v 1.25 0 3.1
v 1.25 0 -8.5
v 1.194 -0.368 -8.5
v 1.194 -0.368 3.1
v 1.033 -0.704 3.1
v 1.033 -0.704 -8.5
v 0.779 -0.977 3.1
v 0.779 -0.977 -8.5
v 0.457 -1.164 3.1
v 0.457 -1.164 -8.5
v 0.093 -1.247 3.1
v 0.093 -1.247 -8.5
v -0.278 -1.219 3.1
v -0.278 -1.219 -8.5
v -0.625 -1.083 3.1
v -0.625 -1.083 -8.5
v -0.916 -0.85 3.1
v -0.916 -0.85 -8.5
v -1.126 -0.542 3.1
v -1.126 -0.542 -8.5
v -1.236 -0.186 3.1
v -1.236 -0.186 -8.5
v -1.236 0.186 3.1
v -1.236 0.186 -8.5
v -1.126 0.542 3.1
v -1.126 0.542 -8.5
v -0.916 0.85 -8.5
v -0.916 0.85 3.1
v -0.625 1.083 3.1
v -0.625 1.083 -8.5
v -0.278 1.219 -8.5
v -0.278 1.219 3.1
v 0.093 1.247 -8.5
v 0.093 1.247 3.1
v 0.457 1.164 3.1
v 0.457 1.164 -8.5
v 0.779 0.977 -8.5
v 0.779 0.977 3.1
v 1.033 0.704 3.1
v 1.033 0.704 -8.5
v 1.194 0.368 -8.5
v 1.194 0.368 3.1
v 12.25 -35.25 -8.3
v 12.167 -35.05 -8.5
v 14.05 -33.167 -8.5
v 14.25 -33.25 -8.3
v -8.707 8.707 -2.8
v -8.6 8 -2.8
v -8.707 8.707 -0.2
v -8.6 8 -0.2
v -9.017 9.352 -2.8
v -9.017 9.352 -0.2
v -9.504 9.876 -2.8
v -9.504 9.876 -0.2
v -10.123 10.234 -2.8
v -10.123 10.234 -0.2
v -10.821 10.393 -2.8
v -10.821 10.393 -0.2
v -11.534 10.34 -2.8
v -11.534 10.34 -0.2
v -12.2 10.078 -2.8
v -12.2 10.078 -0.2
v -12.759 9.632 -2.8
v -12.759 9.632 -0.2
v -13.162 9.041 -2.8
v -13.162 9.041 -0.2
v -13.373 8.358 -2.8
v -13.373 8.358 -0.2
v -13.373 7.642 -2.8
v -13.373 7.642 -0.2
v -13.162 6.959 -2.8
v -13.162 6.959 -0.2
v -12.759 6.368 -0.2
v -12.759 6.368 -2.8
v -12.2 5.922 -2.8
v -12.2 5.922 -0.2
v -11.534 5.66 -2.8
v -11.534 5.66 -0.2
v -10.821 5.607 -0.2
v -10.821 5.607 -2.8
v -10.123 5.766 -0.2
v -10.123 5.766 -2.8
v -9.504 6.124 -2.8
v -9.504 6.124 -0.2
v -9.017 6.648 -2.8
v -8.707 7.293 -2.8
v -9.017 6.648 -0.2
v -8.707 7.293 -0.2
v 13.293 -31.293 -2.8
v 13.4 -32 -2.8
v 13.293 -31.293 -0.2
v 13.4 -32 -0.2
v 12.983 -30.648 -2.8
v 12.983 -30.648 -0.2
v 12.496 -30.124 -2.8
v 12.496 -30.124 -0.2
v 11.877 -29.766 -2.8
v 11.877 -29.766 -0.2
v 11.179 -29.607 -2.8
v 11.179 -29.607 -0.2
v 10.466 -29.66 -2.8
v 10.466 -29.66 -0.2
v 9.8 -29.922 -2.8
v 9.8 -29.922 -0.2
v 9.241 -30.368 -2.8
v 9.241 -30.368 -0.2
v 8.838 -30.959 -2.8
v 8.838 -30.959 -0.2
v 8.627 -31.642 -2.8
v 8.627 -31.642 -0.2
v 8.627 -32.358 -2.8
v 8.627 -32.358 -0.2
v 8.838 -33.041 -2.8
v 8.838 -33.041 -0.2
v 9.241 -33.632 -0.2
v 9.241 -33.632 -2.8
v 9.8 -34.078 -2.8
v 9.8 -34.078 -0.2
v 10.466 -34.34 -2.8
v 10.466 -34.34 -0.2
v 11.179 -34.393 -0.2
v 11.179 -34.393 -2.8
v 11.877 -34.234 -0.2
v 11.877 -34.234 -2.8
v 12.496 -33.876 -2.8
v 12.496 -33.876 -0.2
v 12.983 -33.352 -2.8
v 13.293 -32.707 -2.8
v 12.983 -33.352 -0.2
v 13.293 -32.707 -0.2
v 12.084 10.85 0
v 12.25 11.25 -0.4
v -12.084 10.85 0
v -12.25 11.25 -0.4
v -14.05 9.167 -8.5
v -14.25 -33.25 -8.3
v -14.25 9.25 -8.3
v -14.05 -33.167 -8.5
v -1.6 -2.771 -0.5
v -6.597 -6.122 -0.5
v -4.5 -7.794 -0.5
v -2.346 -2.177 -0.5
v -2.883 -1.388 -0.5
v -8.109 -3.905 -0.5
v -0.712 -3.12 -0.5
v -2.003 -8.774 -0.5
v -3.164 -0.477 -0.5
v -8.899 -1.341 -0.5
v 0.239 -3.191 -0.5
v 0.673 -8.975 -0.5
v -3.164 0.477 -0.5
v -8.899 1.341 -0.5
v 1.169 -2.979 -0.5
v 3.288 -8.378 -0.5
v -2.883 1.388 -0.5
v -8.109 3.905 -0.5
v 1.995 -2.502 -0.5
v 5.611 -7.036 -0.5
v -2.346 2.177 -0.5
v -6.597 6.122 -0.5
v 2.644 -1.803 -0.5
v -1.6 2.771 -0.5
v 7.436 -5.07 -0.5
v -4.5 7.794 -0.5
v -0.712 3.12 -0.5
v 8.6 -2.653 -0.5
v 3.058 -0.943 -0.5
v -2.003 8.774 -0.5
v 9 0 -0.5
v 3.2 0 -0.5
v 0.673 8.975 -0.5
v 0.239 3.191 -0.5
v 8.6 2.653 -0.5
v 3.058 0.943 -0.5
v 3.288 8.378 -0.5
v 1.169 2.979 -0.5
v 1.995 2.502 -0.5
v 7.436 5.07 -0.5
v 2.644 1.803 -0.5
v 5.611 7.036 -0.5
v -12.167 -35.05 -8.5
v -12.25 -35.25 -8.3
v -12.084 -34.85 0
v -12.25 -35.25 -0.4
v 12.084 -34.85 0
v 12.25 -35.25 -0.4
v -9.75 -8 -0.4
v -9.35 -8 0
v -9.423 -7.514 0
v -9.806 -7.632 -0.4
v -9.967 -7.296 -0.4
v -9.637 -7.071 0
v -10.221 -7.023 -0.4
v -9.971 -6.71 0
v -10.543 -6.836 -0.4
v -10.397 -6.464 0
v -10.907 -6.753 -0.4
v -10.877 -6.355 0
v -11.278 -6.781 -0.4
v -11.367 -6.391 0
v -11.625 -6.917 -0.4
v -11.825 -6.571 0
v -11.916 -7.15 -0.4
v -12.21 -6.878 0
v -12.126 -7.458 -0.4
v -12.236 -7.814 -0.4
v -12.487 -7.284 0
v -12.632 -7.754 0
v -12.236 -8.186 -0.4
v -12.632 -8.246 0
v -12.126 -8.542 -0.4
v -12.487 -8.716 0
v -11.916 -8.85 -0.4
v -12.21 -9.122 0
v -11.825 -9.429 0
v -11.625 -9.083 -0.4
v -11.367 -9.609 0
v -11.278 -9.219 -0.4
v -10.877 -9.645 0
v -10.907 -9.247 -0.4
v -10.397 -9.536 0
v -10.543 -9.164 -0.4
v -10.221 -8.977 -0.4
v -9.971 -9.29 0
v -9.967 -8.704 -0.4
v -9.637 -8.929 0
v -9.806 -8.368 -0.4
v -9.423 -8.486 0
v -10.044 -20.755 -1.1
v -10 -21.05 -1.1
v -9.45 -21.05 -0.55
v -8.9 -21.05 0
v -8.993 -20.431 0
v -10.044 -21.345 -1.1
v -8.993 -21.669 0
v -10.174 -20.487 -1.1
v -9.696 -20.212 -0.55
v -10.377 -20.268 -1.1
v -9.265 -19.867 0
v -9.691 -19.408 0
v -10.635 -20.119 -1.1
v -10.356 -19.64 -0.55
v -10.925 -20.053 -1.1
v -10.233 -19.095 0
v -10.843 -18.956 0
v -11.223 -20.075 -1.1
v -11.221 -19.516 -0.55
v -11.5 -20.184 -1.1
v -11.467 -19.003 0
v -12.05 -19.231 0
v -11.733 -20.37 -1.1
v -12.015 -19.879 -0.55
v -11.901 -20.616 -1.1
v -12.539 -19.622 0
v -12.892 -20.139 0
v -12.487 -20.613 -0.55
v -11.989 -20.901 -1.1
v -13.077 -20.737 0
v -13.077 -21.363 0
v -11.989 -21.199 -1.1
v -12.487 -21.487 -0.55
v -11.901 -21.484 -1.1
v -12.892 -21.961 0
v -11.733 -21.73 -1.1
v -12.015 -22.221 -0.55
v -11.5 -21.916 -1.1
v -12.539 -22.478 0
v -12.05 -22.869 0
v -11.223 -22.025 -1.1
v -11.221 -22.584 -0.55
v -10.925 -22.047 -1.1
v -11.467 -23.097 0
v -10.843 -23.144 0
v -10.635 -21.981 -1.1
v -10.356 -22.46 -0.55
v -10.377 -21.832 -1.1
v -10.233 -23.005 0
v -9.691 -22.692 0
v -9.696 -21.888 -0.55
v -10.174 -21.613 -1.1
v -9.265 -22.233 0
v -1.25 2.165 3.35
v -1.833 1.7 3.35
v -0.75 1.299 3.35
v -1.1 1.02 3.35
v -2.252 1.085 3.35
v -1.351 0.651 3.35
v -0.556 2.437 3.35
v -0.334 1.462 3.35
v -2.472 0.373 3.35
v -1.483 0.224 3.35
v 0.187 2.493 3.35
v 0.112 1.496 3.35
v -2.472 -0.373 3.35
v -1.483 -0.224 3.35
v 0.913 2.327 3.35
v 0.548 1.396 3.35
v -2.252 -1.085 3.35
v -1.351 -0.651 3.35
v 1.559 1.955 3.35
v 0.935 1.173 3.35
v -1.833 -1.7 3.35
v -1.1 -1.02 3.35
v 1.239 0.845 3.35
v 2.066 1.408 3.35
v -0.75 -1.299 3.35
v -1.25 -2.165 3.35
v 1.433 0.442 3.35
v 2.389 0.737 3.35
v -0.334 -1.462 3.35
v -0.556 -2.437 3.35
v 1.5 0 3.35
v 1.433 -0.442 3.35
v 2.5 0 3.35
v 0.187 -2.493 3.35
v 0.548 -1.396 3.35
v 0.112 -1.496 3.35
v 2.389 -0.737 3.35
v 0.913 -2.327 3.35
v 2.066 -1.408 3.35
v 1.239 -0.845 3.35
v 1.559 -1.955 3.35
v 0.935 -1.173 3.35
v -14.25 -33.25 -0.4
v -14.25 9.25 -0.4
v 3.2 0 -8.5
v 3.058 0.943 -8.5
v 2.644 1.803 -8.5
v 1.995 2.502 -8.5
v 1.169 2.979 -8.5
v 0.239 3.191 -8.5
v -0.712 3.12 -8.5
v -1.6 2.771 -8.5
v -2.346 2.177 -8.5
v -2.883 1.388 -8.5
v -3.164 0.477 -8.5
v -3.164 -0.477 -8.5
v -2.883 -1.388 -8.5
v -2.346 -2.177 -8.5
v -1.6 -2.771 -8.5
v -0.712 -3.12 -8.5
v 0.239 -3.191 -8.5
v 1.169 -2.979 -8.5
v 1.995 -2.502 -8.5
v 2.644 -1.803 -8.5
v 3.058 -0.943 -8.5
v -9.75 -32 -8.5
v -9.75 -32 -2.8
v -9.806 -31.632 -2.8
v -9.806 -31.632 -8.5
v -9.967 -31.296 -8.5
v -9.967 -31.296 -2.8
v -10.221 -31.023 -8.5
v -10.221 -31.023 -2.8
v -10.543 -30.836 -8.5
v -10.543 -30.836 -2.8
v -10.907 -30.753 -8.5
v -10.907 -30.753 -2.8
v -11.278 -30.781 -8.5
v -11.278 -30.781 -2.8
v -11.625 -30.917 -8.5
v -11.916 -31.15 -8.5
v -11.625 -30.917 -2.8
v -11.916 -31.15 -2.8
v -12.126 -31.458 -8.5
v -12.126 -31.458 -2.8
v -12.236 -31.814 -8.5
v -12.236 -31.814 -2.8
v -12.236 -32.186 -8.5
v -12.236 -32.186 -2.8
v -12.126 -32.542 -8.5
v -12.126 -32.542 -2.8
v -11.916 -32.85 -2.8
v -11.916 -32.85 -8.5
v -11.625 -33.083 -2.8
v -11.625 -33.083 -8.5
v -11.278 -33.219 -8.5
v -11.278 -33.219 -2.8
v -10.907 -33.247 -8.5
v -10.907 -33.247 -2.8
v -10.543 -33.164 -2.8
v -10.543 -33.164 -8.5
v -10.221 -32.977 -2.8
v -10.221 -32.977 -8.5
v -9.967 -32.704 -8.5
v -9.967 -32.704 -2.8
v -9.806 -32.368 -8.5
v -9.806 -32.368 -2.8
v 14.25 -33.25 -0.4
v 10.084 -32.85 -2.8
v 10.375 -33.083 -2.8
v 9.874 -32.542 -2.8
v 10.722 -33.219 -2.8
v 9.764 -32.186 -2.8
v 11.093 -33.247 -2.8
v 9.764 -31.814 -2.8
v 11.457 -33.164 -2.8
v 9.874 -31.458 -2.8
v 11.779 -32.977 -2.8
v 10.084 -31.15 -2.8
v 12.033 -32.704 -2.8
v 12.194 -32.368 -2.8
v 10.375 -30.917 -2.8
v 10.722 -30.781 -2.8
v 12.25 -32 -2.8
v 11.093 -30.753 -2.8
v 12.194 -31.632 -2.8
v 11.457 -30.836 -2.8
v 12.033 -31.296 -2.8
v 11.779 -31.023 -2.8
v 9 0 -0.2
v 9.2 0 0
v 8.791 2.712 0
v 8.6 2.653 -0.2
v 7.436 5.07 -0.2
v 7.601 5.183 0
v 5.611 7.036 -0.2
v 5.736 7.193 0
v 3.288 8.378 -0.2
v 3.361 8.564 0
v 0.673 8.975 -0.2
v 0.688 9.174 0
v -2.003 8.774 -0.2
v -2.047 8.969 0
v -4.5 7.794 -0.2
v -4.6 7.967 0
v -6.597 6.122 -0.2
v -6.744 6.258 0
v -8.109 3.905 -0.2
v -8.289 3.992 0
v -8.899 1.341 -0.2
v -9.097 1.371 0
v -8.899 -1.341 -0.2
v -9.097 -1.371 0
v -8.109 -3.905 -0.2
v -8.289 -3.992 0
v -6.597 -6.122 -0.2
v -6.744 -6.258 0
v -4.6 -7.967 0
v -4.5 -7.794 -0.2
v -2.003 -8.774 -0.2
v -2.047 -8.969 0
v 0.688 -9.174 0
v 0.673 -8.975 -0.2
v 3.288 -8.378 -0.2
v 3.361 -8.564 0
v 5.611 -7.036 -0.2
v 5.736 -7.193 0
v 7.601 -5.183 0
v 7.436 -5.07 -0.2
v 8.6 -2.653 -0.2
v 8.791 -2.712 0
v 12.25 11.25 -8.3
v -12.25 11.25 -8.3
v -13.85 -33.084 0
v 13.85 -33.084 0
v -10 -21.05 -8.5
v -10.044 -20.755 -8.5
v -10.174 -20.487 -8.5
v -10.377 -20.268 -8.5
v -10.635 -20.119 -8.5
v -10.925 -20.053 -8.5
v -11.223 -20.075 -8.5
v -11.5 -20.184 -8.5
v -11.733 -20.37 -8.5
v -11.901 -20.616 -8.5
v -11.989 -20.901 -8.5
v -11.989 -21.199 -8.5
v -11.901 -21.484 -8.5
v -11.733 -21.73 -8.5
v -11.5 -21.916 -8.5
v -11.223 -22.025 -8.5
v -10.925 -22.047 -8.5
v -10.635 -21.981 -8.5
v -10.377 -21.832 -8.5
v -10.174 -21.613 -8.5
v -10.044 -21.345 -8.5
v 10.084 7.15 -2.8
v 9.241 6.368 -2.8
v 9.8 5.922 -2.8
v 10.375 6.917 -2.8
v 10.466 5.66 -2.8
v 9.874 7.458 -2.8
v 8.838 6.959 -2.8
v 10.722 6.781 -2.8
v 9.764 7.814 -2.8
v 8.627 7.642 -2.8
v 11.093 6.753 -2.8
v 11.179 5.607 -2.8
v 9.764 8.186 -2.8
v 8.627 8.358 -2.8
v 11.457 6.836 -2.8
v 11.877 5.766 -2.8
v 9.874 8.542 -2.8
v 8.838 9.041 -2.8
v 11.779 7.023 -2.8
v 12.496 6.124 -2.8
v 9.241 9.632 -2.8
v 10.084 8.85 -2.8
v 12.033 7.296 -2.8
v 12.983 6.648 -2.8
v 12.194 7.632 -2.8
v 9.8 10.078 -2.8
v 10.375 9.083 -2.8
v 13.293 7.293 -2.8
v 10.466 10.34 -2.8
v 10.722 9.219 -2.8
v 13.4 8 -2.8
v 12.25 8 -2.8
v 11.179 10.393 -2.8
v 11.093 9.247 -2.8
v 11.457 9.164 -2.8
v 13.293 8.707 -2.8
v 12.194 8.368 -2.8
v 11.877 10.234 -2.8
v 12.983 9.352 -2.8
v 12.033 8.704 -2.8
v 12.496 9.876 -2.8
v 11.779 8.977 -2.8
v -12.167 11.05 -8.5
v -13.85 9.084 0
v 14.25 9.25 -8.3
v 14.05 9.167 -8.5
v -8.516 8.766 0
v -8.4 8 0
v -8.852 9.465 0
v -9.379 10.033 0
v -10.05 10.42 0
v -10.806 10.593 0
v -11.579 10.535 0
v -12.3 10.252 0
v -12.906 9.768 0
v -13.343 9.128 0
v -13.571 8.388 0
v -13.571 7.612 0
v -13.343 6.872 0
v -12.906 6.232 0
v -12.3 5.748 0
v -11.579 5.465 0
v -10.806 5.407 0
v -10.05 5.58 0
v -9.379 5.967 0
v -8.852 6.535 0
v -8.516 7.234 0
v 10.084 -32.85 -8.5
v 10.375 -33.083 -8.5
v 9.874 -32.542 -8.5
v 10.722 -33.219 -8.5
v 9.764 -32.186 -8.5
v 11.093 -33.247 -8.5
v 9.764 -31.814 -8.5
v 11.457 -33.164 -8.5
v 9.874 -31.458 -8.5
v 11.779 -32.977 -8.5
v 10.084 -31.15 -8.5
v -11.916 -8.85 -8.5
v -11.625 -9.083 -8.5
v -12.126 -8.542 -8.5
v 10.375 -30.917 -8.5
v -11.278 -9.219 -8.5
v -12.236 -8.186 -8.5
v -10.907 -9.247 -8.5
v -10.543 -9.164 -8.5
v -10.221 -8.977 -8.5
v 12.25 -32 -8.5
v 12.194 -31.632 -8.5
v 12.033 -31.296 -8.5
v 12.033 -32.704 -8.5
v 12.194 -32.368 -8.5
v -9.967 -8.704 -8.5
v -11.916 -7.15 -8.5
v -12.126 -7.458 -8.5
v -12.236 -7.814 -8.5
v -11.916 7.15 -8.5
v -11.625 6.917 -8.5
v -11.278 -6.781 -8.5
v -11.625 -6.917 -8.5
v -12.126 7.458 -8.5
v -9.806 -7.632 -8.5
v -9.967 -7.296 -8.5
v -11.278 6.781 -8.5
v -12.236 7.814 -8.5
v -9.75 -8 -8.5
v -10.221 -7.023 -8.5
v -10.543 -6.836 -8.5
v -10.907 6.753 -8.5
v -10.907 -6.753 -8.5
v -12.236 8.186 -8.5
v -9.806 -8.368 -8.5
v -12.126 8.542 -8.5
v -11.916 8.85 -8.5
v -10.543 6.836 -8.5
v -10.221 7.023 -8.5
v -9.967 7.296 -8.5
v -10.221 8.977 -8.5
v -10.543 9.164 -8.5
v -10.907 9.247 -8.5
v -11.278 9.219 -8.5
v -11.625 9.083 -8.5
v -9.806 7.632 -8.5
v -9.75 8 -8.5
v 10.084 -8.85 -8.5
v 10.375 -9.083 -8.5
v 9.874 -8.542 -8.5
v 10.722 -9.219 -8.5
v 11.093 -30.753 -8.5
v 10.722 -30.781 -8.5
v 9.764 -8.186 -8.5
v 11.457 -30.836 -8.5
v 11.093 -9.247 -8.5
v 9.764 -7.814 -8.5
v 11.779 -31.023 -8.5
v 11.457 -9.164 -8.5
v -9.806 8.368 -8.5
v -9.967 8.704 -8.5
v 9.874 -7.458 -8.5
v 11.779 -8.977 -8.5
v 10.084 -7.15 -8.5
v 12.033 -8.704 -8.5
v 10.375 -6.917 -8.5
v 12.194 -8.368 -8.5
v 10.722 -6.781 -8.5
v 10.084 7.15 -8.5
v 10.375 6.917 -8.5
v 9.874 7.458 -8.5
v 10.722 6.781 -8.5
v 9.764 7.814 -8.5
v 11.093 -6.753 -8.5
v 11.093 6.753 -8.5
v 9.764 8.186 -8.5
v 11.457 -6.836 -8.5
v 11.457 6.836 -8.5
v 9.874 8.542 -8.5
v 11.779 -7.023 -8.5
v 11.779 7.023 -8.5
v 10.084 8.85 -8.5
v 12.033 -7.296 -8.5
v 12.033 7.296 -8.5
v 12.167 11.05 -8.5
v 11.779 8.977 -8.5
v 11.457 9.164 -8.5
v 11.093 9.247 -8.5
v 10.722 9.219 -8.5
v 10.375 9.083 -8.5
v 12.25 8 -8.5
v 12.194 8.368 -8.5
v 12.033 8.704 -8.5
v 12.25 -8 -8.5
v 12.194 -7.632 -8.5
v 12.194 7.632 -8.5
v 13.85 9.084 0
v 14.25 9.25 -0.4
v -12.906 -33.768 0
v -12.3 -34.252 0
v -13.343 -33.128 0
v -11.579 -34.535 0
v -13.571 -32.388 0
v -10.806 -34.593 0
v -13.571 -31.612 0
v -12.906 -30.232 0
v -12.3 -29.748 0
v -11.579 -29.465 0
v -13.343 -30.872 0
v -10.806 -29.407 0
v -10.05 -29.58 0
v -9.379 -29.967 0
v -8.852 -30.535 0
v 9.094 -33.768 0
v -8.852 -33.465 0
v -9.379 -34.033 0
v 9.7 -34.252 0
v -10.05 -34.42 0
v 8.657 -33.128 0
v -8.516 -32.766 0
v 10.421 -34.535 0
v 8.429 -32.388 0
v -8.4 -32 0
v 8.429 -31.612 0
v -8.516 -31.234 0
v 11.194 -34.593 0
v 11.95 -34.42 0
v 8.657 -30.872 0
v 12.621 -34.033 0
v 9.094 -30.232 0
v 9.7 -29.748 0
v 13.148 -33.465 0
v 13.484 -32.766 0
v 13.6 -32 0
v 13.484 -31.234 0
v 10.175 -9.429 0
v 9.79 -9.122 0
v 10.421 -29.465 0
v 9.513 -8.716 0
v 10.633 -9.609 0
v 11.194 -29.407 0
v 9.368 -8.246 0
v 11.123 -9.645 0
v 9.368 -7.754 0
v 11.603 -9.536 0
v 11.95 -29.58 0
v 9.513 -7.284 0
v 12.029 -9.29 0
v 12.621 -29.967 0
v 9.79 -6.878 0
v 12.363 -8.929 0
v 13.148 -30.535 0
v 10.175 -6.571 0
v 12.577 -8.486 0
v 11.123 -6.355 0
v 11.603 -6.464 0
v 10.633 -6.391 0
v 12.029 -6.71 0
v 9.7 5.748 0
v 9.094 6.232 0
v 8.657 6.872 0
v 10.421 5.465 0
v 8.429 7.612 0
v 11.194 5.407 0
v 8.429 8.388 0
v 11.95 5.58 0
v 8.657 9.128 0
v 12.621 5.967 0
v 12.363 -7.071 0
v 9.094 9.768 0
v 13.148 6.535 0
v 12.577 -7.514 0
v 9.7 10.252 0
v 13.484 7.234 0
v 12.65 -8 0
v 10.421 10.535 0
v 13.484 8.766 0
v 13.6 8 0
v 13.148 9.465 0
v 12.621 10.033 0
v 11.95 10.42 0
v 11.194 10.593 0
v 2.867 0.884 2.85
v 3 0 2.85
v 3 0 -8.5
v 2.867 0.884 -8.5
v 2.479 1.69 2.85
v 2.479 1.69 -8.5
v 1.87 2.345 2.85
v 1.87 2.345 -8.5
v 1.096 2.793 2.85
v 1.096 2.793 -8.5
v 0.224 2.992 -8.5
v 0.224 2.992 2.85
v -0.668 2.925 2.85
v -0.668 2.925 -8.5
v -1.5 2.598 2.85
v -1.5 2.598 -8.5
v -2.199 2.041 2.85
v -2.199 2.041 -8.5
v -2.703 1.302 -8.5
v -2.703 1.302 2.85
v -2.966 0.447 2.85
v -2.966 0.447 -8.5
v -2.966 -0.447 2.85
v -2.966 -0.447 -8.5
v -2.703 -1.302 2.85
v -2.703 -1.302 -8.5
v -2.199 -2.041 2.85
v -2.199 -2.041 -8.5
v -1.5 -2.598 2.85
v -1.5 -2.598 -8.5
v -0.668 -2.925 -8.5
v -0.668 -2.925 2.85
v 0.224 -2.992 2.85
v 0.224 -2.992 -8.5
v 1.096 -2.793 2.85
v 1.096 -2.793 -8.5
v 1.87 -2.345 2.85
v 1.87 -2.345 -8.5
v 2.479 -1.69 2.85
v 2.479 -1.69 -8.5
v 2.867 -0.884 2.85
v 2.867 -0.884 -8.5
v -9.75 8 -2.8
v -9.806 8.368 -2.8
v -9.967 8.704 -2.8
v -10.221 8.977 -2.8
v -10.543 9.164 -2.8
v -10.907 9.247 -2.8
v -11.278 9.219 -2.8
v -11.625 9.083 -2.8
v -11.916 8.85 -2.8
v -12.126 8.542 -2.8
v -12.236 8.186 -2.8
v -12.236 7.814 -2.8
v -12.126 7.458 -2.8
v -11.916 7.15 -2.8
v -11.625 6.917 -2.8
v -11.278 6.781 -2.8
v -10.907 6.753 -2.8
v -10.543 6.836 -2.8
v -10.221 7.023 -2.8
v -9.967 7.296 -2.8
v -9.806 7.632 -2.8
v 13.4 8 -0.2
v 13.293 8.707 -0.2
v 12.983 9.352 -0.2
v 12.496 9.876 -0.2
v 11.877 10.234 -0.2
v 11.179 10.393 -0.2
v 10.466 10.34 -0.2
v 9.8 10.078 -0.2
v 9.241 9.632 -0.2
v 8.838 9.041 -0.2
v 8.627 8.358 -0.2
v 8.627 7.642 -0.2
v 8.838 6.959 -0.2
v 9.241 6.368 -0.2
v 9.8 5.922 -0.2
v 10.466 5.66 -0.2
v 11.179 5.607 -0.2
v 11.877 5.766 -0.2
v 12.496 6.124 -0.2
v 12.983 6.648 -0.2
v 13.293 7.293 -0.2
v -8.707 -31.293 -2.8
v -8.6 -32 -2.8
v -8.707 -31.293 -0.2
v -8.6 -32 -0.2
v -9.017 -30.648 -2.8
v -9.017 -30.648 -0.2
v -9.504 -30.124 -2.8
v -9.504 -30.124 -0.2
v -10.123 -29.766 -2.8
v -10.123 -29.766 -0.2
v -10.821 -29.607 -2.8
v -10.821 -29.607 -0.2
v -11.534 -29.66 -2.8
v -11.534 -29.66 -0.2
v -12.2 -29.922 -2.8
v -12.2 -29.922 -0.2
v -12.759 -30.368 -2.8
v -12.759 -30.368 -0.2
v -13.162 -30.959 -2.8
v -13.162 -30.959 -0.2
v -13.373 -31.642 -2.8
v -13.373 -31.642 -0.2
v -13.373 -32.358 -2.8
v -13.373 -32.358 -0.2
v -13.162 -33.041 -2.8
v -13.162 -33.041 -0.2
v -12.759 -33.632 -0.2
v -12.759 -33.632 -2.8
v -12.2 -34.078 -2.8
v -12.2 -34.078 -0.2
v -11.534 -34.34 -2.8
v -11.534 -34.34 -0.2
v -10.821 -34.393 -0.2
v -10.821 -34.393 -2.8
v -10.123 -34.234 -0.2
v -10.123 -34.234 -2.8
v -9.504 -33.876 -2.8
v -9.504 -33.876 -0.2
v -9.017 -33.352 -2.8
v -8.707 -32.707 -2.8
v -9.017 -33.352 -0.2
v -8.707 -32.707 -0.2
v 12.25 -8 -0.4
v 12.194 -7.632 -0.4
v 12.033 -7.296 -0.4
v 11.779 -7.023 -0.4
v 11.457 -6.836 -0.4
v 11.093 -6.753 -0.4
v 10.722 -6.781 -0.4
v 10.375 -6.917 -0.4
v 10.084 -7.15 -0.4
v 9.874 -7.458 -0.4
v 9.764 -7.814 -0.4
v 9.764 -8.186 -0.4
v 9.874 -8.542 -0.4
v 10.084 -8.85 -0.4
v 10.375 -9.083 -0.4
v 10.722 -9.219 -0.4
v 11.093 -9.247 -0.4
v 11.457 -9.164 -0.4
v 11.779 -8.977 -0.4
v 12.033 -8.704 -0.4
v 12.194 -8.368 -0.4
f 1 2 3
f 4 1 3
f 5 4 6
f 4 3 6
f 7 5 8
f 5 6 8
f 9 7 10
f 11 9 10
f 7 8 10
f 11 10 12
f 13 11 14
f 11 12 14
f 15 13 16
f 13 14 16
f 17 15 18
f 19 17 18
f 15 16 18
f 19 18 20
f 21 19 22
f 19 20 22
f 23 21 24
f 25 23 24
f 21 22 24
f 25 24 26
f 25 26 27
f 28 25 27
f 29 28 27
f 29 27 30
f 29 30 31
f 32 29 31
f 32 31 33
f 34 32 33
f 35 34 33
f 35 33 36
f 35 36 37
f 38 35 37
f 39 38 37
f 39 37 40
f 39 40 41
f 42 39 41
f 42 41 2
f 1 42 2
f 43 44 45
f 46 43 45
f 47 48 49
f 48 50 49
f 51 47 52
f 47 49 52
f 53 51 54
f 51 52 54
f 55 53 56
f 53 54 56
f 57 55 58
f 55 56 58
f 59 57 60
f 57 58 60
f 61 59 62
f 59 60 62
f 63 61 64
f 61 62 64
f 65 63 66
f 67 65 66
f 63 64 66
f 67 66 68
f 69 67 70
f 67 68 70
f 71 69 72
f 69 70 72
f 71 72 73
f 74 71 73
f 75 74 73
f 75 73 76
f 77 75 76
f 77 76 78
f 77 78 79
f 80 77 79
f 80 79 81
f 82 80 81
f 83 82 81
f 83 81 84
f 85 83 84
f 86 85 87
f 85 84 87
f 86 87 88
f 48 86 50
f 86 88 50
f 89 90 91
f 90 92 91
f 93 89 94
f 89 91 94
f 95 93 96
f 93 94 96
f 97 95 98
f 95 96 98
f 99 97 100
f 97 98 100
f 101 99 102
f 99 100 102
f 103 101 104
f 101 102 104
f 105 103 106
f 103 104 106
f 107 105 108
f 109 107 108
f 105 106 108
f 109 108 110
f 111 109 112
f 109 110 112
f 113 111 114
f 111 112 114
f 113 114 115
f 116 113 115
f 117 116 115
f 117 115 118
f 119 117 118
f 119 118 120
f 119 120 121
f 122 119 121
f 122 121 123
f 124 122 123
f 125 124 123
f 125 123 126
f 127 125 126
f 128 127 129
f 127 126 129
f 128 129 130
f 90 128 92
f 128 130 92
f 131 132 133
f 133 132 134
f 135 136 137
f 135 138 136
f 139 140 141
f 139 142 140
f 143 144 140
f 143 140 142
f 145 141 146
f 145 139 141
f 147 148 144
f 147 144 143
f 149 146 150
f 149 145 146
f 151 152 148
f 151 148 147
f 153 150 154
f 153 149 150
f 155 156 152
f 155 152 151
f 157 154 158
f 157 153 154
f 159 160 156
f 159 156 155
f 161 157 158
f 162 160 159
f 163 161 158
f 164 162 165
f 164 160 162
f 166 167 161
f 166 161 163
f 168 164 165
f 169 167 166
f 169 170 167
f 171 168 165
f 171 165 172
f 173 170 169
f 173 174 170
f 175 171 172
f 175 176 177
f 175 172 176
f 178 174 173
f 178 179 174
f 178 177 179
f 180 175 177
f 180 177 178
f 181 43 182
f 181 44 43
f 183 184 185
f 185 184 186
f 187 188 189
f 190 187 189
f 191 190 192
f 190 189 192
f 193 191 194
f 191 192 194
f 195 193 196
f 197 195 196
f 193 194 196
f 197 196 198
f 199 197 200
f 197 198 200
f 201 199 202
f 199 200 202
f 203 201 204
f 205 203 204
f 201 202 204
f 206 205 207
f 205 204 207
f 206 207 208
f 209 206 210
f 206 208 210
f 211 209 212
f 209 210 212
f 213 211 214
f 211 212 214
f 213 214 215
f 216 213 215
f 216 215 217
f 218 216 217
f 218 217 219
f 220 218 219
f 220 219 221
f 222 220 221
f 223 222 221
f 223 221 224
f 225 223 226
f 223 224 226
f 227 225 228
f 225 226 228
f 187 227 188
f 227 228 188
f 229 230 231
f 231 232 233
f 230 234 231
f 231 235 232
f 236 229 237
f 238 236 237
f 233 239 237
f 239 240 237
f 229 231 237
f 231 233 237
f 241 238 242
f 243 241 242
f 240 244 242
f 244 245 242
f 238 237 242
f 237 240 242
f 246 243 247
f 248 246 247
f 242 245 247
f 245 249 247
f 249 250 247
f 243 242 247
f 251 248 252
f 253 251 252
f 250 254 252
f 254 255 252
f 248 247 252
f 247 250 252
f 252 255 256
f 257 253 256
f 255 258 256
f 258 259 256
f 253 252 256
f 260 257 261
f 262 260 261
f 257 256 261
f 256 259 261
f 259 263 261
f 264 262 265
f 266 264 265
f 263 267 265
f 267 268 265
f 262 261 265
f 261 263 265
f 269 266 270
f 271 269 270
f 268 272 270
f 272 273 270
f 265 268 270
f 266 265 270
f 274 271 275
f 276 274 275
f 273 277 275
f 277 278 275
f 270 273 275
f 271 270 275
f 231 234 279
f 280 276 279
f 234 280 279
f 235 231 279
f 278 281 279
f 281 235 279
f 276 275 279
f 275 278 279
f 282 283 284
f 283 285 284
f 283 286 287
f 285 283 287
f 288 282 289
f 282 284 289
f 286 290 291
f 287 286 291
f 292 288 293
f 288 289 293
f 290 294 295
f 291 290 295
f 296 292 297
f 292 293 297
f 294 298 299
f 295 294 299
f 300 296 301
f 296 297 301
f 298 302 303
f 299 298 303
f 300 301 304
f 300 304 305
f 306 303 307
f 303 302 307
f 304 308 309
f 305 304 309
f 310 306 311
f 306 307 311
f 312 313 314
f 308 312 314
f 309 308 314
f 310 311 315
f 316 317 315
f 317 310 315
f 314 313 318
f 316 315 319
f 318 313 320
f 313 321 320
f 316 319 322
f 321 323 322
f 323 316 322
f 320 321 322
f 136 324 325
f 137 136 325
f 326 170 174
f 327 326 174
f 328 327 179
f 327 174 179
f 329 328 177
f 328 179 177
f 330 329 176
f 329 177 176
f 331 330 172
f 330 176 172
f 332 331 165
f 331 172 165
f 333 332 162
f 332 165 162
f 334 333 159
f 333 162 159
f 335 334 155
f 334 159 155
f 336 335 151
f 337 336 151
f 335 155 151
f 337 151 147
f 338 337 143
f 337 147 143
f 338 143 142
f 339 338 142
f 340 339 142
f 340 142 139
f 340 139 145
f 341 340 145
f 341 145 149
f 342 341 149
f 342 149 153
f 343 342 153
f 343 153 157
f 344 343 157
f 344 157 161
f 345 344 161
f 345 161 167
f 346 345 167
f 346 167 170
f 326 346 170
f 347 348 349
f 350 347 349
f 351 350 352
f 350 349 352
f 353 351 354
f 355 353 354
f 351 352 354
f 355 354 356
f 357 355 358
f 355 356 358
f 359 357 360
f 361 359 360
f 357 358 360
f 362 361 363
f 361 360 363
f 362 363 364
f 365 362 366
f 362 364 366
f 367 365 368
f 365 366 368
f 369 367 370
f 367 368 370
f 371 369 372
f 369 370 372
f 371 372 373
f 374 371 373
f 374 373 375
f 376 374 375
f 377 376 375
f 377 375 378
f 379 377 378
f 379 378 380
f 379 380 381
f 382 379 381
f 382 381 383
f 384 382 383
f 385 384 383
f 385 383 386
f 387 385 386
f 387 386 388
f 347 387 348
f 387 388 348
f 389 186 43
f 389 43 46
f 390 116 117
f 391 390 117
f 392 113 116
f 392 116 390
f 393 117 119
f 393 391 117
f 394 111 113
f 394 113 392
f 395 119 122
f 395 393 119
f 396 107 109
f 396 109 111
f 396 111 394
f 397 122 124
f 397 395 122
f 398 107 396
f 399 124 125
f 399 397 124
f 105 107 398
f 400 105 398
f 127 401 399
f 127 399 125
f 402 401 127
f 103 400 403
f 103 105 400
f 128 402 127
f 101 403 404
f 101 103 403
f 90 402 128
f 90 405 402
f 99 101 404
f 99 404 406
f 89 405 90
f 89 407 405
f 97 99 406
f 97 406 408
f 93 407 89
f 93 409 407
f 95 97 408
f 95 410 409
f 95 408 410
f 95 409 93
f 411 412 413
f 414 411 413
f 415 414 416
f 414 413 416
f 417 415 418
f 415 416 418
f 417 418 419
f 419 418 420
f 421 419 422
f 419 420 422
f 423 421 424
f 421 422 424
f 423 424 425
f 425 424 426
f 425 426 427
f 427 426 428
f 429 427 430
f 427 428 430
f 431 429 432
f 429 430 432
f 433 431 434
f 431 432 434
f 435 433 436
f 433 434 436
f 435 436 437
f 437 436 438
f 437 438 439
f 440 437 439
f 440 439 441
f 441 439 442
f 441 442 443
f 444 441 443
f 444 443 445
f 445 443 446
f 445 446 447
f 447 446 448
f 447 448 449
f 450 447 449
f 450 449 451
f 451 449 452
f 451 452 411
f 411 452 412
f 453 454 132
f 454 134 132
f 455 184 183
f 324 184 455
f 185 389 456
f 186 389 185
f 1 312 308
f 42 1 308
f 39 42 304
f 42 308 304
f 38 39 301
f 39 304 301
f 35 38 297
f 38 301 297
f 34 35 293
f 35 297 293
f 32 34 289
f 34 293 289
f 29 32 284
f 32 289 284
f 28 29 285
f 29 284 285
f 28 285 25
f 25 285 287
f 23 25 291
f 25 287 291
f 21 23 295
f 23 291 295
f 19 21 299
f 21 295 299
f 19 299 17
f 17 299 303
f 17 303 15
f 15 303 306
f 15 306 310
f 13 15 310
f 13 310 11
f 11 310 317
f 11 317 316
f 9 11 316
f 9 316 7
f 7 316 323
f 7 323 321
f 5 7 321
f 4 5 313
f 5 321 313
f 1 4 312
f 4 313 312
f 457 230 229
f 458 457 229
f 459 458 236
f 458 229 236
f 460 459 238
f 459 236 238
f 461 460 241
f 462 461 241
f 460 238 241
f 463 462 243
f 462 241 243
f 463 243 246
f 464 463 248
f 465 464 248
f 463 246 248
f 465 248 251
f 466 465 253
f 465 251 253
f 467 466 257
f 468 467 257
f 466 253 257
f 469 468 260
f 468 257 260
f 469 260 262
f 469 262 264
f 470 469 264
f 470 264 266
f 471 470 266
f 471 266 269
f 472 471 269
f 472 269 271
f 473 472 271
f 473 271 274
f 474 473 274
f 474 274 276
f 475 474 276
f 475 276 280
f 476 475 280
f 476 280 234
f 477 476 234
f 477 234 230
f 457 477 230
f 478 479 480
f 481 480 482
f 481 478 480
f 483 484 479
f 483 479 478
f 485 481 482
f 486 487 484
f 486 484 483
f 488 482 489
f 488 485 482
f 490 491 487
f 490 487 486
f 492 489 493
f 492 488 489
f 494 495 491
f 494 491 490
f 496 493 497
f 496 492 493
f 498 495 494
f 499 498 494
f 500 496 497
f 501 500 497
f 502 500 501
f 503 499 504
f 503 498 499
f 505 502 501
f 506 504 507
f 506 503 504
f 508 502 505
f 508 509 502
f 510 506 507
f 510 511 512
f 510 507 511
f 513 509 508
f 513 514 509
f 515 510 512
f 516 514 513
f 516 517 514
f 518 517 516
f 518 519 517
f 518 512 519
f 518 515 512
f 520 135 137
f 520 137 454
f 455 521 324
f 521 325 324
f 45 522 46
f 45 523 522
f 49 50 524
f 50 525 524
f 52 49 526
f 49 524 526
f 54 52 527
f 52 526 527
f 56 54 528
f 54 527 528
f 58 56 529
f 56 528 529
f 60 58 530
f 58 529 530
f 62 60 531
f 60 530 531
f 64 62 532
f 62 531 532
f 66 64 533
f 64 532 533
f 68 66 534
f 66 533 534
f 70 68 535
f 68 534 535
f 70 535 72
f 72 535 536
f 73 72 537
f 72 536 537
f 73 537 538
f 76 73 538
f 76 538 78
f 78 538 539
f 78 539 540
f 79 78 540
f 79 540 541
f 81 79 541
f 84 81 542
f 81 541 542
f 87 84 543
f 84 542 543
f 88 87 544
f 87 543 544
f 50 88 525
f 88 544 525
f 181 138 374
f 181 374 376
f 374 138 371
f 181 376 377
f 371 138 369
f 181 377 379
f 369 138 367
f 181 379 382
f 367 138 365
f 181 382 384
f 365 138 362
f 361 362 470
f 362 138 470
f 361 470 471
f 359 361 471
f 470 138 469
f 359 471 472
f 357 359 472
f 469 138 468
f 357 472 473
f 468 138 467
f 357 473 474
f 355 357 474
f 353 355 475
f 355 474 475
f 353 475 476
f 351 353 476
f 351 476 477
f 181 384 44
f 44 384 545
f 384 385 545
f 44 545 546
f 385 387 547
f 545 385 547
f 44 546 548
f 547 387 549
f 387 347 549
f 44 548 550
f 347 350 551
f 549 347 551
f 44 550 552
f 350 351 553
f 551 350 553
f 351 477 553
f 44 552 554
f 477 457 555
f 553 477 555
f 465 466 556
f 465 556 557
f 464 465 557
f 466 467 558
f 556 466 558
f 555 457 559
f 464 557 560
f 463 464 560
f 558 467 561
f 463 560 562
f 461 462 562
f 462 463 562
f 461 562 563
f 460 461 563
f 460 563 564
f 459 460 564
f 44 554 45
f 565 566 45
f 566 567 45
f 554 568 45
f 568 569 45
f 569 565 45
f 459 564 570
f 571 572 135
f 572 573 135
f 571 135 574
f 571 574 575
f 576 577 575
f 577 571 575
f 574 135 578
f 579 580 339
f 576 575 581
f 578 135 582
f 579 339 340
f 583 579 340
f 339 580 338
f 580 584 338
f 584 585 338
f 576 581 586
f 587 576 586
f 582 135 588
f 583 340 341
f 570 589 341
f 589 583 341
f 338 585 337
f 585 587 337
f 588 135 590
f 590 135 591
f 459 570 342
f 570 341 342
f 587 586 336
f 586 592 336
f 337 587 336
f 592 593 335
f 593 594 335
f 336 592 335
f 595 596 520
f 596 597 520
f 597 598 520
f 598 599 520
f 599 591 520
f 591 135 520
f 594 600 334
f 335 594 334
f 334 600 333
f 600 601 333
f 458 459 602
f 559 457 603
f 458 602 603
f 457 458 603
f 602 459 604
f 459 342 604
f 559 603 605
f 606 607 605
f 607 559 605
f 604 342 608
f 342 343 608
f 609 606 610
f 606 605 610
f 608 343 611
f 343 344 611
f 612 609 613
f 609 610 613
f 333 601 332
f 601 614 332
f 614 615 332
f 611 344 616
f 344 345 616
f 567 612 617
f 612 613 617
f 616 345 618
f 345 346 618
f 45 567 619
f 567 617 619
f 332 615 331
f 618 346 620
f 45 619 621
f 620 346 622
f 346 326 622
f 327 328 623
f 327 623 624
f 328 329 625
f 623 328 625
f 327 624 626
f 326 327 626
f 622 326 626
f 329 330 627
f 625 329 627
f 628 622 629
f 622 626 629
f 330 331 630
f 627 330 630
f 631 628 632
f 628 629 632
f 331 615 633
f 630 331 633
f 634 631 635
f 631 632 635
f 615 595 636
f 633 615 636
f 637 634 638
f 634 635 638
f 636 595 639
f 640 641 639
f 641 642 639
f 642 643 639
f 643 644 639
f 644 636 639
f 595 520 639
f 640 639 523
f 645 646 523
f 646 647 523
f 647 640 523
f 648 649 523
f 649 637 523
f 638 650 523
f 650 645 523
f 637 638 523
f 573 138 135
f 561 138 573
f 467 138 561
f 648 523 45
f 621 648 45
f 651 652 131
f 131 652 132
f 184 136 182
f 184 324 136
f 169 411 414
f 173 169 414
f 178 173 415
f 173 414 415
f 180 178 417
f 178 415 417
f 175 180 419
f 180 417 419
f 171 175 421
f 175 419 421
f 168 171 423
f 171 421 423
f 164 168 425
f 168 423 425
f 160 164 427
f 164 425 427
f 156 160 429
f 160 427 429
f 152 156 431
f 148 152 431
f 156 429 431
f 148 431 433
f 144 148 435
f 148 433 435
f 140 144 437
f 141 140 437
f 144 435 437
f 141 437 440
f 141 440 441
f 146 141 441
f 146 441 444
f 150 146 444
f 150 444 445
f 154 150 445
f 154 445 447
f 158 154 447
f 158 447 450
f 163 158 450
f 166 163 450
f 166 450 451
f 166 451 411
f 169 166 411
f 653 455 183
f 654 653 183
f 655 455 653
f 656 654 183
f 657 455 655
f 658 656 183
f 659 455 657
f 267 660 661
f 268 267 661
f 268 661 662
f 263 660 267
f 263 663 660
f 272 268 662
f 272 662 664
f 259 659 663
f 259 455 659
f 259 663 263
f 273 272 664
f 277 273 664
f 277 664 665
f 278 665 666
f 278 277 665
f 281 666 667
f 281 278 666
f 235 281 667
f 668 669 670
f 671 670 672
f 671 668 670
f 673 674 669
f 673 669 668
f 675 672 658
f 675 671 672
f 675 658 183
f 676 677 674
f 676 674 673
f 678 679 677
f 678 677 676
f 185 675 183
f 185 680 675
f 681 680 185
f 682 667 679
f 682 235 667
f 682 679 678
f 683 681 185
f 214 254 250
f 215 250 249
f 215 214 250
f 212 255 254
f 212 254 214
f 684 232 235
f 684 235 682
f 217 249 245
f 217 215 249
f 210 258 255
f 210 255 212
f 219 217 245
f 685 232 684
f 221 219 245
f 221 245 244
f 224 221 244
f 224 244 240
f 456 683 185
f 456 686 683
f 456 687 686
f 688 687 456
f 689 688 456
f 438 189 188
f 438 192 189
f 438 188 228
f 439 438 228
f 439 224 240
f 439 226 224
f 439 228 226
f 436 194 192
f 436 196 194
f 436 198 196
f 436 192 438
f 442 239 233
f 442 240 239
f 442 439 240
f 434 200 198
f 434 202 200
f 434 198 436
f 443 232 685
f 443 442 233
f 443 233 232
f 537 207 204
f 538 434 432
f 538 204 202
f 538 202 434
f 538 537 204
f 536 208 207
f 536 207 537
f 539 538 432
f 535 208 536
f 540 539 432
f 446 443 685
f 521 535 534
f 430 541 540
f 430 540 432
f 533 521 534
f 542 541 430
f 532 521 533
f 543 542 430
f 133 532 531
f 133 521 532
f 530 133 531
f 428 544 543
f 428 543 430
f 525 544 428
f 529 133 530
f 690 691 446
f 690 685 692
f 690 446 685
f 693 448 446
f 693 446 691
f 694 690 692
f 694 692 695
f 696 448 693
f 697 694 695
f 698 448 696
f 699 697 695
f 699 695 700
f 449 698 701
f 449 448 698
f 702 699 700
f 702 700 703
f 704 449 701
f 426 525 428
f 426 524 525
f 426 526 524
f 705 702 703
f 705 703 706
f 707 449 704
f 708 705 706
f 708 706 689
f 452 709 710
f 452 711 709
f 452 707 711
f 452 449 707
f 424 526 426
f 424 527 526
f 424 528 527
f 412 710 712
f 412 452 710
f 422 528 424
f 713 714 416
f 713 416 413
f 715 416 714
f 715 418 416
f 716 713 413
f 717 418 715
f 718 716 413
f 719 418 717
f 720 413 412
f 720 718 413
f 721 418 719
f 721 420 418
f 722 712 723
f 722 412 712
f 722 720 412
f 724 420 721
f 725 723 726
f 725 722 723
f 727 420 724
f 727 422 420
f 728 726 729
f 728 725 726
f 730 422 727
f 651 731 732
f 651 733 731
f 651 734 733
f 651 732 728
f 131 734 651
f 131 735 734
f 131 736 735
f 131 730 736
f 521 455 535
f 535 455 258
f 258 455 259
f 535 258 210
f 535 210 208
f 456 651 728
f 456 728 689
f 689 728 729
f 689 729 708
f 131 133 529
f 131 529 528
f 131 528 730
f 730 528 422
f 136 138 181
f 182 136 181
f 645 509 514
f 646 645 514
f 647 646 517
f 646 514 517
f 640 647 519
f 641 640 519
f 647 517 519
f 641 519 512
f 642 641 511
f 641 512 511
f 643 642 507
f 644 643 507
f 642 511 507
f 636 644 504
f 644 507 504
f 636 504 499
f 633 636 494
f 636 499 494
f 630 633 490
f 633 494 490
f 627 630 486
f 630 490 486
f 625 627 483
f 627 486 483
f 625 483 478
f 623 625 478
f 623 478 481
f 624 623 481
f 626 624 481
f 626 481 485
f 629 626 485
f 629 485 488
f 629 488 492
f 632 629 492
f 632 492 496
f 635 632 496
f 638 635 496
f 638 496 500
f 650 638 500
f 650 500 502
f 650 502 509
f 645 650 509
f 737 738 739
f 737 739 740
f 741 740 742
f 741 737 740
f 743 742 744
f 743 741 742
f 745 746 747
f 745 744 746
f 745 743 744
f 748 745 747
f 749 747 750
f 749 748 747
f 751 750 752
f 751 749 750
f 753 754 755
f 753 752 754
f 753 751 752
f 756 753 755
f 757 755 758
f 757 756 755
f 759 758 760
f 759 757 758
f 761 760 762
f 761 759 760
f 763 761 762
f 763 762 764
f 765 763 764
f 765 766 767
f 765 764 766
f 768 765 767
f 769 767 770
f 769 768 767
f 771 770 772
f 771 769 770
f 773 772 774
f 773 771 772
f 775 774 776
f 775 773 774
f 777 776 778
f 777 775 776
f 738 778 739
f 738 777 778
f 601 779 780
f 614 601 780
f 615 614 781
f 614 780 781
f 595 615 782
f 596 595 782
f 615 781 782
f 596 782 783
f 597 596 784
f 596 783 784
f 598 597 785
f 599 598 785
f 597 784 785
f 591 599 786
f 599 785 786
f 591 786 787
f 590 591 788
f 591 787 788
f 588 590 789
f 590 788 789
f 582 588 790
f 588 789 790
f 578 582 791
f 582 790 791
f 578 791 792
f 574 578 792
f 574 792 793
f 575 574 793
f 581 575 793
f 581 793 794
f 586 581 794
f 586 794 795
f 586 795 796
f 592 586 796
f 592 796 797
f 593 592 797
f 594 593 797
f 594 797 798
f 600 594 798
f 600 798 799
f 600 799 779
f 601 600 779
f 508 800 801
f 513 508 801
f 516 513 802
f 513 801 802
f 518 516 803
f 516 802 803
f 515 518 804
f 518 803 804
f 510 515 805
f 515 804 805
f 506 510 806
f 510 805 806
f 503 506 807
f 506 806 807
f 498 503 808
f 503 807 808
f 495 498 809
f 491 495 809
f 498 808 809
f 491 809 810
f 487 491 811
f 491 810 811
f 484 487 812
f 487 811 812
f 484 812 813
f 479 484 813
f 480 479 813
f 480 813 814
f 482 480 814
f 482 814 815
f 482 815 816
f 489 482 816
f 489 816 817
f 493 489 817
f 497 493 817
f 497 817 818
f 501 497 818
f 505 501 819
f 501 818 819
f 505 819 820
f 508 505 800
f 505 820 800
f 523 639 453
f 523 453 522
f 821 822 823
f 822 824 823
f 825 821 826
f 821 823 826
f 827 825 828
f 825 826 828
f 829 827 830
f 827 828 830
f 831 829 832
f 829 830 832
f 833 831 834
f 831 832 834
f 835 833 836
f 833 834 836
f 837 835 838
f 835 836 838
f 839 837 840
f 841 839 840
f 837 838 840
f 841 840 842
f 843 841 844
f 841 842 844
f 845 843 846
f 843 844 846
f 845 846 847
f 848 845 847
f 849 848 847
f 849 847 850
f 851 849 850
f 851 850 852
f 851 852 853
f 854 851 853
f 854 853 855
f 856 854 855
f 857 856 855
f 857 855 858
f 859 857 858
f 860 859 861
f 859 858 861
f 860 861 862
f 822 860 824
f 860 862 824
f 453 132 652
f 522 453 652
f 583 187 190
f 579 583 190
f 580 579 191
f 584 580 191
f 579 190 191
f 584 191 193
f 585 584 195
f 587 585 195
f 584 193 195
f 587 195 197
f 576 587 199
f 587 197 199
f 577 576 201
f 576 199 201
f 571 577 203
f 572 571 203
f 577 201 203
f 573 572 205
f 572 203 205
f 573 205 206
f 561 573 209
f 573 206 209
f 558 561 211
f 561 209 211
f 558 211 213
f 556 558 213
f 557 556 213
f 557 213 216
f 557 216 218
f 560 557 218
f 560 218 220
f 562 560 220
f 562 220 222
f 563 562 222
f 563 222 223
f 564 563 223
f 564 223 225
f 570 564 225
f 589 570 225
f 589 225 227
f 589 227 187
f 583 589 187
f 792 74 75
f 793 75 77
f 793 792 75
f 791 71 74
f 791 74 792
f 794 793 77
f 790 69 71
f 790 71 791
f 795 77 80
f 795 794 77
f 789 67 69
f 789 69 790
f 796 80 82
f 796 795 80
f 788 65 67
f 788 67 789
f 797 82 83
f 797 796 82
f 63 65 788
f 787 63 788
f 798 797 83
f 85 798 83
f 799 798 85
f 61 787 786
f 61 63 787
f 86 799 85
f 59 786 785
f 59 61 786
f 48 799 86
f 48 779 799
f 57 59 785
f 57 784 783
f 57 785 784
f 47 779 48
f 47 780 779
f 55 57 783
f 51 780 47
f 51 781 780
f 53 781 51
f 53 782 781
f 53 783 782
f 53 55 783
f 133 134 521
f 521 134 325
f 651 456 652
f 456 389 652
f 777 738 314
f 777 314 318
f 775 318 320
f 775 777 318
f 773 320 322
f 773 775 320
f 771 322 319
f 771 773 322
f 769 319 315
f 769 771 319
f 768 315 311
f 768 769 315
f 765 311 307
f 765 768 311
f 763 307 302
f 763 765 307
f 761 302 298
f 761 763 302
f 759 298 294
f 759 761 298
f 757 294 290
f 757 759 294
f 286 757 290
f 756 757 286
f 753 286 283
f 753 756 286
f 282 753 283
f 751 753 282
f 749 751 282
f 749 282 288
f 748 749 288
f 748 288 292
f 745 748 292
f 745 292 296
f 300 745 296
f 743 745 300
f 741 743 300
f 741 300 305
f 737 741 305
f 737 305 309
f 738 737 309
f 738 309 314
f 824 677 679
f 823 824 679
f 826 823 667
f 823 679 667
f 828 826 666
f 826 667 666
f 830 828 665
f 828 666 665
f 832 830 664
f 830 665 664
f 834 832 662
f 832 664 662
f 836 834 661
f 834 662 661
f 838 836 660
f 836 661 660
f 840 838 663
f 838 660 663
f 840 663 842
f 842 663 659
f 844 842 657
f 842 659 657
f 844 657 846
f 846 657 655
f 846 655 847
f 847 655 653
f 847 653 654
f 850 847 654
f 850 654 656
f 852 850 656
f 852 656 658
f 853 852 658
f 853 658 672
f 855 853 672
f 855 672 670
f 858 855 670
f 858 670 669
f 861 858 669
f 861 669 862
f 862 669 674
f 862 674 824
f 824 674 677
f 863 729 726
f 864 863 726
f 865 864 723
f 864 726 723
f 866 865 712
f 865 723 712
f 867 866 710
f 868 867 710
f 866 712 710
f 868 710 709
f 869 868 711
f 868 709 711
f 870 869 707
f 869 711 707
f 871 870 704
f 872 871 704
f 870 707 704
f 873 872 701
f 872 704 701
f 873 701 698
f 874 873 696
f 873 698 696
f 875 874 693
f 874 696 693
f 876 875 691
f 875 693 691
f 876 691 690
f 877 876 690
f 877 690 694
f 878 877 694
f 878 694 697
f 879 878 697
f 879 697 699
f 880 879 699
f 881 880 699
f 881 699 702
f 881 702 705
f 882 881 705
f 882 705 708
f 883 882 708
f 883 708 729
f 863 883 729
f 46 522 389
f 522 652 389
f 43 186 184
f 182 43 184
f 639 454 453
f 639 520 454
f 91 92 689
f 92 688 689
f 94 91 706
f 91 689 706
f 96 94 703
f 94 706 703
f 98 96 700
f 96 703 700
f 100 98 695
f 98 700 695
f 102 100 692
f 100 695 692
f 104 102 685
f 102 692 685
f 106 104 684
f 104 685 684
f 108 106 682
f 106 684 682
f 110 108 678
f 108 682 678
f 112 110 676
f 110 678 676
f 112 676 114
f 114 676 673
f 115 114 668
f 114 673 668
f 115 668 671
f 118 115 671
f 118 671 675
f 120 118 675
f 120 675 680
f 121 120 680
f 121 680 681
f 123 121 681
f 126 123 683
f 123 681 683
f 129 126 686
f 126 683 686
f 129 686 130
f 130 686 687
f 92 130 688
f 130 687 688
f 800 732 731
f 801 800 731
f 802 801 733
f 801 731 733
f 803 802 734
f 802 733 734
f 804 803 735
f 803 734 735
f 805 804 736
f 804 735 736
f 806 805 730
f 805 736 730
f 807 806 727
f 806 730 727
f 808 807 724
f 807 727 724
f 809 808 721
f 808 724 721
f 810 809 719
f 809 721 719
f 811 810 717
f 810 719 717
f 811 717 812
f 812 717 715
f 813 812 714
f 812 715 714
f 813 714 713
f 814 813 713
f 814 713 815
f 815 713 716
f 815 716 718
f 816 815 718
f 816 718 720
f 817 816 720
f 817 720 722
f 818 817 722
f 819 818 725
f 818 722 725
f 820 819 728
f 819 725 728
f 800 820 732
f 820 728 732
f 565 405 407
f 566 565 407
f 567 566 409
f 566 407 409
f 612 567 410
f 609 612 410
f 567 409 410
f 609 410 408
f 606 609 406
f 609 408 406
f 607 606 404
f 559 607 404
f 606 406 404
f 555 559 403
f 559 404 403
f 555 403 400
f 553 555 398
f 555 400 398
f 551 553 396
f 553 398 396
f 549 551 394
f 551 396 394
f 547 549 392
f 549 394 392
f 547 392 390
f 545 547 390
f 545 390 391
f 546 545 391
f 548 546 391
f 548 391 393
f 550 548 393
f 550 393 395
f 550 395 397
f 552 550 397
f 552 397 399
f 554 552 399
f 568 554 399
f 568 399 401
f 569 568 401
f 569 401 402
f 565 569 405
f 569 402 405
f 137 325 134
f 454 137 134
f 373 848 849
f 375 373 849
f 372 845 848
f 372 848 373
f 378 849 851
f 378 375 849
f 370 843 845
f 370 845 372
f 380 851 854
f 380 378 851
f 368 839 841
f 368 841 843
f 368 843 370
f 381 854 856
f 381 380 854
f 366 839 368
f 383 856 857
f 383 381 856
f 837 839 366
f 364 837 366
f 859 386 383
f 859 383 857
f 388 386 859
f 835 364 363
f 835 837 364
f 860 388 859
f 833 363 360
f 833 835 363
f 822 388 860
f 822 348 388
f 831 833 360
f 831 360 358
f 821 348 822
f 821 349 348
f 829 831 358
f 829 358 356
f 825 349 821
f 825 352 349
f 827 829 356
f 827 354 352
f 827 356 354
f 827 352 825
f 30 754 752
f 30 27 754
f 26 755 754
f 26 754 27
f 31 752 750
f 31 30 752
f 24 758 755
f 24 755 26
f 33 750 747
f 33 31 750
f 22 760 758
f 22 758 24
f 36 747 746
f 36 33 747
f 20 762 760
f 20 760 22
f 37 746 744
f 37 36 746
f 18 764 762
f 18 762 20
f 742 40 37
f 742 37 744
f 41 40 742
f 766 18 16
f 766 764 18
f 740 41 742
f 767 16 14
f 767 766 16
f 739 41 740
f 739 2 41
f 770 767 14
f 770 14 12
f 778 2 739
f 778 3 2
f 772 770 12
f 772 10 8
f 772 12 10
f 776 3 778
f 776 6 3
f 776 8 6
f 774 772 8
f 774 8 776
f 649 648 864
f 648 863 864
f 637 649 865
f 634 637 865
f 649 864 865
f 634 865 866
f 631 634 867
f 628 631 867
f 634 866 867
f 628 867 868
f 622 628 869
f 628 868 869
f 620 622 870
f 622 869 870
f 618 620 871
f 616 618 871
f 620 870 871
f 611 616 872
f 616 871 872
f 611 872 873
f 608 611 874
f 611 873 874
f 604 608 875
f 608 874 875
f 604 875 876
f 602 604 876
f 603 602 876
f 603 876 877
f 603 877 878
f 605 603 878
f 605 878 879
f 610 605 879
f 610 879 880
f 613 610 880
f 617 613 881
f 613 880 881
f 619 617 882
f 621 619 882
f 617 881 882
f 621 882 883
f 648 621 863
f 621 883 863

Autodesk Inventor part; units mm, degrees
ref_plane "YZ Plane" through (0, 0, 0) normal (1, 0, 0) x (0, 1, 0)
ref_plane "XZ Plane" through (0, 0, 0) normal (0, 1, 0) x (-1, 0, 0)
ref_plane "XY Plane" through (0, 0, 0) normal (0, 0, 1) x (1, 0, 0)
sketch "スケッチ1" plane through (0, 0, 0) normal (0, 0, 1) x (1, 0, 0)
  line L0 (-12.25, 11.25) -> (12.25, 11.25)
  line L1 (14.25, 9.25) -> (14.25, -33.25)
  line L2 (12.25, -35.25) -> (-12.25, -35.25)
  line L3 (-14.25, -33.25) -> (-14.25, 9.25)
  circle A0 centre (11, 8) radius 1.25
  circle A1 centre (11, -8) radius 1.25
  circle A2 centre (11, -32) radius 1.25
  line L4 (0, 0) -> (0, 13.0678) construction
  circle A3 centre (-11, 8) radius 1.25
  circle A4 centre (-11, -8) radius 1.25
  circle A5 centre (-11, -32) radius 1.25
  line L5 (-26.5405, 0) -> (16.6243, 0) construction
  line L6 (11, 8) -> (11, -8) construction
  line L7 (11, -8) -> (11, -32) construction
  circle A6 centre (-11, -21.05) radius 1
  line L8 (-11, -21.05) -> (-11, -32) construction
  line L9 (-14.25, 9.25) -> (-12.25, 11.25)
  line L10 (12.25, 11.25) -> (14.25, 9.25)
  line L11 (12.25, -35.25) -> (14.25, -33.25)
  line L12 (-14.25, -33.25) -> (-12.25, -35.25)
  circle A7 centre (0, 0) radius 3.2
  point P0 (-14.25, 11.25)
  point P1 (14.25, -35.25)
  point P2 (14.25, 11.25)
  point P3 (-14.25, -35.25)
  dimension "d0" = 2.5
  dimension "d1" = 28.5
  dimension "d3" = 46.5
  dimension "d4" = 8
  dimension "d5" = 8
  dimension "d6" = 22
  dimension "d7" = 40
  dimension "d8" = 2
  dimension "d9" = 14.2
  dimension "d10" = 11.25
  dimension "d11" = 2
  dimension "d12" = 2
  dimension "d13" = 2
  dimension "d14" = 2
  dimension "d15" = 2
  dimension "d16" = 2
  dimension "d17" = 2
  dimension "d18" = 2
  dimension "d41" = 6.4
extrude "押し出し1" add sketch "スケッチ1" against normal blind 8.5
chamfer "面取り1" distance 1.1 angle 45 1 edges at (-12, -21.05, 0)
sketch "スケッチ2" plane through (0, 0, 0) normal (0, 0, 1) x (1, 0, 0)
  circle A0 centre (-11, 8) radius 2.4
  circle A1 centre (11, 8) radius 2.4
  circle A2 centre (11, -32) radius 2.4
  circle A3 centre (-11, -32) radius 2.4
  circle A4 centre (-11, 8) radius 1.25 construction
  circle A5 centre (11, 8) radius 1.25 construction
  circle A6 centre (11, -32) radius 1.25 construction
  circle A7 centre (-11, -32) radius 1.25 construction
  point P0 (0, 0)
  dimension "d25" = 4.8
extrude "押し出し2" cut sketch "スケッチ2" against normal blind 2.8
sketch "スケッチ3" plane through (0, 0, 0) normal (0, 0, 1) x (1, 0, 0)
  circle A0 centre (0, 0) radius 9
  dimension "d40" = 18
extrude "押し出し3" cut sketch "スケッチ3" against normal blind 0.5
chamfer "面取り2" distance 0.4 angle 45 10 edges at (-14.25, -12, 0) (-13.25, 10.25, 0) (0, 11.25, 0) (13.25, 10.25, 0) (14.25, -12, 0) (13.25, -34.25, 0) (0, -35.25, 0) (-13.25, -34.25, 0) (-12.25, -8, 0) (9.75, -8, 0)
chamfer "面取り3" distance 0.2 angle 45 13 edges at (-13.4, 8, 0) (8.6, 8, 0) (-9, 0, 0) (8.6, -32, 0) (-13.4, -32, 0) (-14.25, -12, -8.5) (-13.25, -34.25, -8.5) (0, -35.25, -8.5) (13.25, -34.25, -8.5) (14.25, -12, -8.5) (13.25, 10.25, -8.5) (0, 11.25, -8.5) (-13.25, 10.25, -8.5)
sketch "スケッチ5" plane through (0, 0, 0) normal (0, 1, 0) x (-1, 0, 0)
  line L0 (-1.25, -8.5) -> (-3, -8.5)
  line L1 (-3, -8.5) -> (-3, 2.85)
  line L2 (-2.5, 3.35) -> (-1.5, 3.35)
  line L3 (-1.25, 3.1) -> (-1.25, -8.5)
  line L4 (12.1672, -8.5) -> (-12.1672, -8.5) construction
  line L5 (-12.0843, 0) -> (12.0843, 0) construction
  line L6 (0, 0) -> (0, -12.5423) construction
  line L7 (-3, 2.85) -> (-2.5, 3.35)
  line L8 (-1.5, 3.35) -> (-1.25, 3.1)
  point P0 (-3, 3.35)
  point P1 (-1.25, 3.35)
  dimension "d42" = 2.5
  dimension "d43" = 6
  dimension "d44" = 3.35
  dimension "d45" = 0.5
  dimension "d46" = 0.5
  dimension "d47" = 0.25
  dimension "d48" = 0.25
revolve "回転1" add sketch "スケッチ5" angle 360 about axis through (0, 0, 0) along (0, 0, -1)
equation "\"d12\" = d11"
equation "\"d13\" = d11"
equation "\"d14\" = d13"
equation "\"d15\" = d11"
equation "\"d16\" = d15"
equation "\"d17\" = d11"
equation "\"d18\" = d17"
equation "\"d46\" = d45"
equation "\"d48\" = d47"
properties part number "XM430_HOUSING_TOP"
